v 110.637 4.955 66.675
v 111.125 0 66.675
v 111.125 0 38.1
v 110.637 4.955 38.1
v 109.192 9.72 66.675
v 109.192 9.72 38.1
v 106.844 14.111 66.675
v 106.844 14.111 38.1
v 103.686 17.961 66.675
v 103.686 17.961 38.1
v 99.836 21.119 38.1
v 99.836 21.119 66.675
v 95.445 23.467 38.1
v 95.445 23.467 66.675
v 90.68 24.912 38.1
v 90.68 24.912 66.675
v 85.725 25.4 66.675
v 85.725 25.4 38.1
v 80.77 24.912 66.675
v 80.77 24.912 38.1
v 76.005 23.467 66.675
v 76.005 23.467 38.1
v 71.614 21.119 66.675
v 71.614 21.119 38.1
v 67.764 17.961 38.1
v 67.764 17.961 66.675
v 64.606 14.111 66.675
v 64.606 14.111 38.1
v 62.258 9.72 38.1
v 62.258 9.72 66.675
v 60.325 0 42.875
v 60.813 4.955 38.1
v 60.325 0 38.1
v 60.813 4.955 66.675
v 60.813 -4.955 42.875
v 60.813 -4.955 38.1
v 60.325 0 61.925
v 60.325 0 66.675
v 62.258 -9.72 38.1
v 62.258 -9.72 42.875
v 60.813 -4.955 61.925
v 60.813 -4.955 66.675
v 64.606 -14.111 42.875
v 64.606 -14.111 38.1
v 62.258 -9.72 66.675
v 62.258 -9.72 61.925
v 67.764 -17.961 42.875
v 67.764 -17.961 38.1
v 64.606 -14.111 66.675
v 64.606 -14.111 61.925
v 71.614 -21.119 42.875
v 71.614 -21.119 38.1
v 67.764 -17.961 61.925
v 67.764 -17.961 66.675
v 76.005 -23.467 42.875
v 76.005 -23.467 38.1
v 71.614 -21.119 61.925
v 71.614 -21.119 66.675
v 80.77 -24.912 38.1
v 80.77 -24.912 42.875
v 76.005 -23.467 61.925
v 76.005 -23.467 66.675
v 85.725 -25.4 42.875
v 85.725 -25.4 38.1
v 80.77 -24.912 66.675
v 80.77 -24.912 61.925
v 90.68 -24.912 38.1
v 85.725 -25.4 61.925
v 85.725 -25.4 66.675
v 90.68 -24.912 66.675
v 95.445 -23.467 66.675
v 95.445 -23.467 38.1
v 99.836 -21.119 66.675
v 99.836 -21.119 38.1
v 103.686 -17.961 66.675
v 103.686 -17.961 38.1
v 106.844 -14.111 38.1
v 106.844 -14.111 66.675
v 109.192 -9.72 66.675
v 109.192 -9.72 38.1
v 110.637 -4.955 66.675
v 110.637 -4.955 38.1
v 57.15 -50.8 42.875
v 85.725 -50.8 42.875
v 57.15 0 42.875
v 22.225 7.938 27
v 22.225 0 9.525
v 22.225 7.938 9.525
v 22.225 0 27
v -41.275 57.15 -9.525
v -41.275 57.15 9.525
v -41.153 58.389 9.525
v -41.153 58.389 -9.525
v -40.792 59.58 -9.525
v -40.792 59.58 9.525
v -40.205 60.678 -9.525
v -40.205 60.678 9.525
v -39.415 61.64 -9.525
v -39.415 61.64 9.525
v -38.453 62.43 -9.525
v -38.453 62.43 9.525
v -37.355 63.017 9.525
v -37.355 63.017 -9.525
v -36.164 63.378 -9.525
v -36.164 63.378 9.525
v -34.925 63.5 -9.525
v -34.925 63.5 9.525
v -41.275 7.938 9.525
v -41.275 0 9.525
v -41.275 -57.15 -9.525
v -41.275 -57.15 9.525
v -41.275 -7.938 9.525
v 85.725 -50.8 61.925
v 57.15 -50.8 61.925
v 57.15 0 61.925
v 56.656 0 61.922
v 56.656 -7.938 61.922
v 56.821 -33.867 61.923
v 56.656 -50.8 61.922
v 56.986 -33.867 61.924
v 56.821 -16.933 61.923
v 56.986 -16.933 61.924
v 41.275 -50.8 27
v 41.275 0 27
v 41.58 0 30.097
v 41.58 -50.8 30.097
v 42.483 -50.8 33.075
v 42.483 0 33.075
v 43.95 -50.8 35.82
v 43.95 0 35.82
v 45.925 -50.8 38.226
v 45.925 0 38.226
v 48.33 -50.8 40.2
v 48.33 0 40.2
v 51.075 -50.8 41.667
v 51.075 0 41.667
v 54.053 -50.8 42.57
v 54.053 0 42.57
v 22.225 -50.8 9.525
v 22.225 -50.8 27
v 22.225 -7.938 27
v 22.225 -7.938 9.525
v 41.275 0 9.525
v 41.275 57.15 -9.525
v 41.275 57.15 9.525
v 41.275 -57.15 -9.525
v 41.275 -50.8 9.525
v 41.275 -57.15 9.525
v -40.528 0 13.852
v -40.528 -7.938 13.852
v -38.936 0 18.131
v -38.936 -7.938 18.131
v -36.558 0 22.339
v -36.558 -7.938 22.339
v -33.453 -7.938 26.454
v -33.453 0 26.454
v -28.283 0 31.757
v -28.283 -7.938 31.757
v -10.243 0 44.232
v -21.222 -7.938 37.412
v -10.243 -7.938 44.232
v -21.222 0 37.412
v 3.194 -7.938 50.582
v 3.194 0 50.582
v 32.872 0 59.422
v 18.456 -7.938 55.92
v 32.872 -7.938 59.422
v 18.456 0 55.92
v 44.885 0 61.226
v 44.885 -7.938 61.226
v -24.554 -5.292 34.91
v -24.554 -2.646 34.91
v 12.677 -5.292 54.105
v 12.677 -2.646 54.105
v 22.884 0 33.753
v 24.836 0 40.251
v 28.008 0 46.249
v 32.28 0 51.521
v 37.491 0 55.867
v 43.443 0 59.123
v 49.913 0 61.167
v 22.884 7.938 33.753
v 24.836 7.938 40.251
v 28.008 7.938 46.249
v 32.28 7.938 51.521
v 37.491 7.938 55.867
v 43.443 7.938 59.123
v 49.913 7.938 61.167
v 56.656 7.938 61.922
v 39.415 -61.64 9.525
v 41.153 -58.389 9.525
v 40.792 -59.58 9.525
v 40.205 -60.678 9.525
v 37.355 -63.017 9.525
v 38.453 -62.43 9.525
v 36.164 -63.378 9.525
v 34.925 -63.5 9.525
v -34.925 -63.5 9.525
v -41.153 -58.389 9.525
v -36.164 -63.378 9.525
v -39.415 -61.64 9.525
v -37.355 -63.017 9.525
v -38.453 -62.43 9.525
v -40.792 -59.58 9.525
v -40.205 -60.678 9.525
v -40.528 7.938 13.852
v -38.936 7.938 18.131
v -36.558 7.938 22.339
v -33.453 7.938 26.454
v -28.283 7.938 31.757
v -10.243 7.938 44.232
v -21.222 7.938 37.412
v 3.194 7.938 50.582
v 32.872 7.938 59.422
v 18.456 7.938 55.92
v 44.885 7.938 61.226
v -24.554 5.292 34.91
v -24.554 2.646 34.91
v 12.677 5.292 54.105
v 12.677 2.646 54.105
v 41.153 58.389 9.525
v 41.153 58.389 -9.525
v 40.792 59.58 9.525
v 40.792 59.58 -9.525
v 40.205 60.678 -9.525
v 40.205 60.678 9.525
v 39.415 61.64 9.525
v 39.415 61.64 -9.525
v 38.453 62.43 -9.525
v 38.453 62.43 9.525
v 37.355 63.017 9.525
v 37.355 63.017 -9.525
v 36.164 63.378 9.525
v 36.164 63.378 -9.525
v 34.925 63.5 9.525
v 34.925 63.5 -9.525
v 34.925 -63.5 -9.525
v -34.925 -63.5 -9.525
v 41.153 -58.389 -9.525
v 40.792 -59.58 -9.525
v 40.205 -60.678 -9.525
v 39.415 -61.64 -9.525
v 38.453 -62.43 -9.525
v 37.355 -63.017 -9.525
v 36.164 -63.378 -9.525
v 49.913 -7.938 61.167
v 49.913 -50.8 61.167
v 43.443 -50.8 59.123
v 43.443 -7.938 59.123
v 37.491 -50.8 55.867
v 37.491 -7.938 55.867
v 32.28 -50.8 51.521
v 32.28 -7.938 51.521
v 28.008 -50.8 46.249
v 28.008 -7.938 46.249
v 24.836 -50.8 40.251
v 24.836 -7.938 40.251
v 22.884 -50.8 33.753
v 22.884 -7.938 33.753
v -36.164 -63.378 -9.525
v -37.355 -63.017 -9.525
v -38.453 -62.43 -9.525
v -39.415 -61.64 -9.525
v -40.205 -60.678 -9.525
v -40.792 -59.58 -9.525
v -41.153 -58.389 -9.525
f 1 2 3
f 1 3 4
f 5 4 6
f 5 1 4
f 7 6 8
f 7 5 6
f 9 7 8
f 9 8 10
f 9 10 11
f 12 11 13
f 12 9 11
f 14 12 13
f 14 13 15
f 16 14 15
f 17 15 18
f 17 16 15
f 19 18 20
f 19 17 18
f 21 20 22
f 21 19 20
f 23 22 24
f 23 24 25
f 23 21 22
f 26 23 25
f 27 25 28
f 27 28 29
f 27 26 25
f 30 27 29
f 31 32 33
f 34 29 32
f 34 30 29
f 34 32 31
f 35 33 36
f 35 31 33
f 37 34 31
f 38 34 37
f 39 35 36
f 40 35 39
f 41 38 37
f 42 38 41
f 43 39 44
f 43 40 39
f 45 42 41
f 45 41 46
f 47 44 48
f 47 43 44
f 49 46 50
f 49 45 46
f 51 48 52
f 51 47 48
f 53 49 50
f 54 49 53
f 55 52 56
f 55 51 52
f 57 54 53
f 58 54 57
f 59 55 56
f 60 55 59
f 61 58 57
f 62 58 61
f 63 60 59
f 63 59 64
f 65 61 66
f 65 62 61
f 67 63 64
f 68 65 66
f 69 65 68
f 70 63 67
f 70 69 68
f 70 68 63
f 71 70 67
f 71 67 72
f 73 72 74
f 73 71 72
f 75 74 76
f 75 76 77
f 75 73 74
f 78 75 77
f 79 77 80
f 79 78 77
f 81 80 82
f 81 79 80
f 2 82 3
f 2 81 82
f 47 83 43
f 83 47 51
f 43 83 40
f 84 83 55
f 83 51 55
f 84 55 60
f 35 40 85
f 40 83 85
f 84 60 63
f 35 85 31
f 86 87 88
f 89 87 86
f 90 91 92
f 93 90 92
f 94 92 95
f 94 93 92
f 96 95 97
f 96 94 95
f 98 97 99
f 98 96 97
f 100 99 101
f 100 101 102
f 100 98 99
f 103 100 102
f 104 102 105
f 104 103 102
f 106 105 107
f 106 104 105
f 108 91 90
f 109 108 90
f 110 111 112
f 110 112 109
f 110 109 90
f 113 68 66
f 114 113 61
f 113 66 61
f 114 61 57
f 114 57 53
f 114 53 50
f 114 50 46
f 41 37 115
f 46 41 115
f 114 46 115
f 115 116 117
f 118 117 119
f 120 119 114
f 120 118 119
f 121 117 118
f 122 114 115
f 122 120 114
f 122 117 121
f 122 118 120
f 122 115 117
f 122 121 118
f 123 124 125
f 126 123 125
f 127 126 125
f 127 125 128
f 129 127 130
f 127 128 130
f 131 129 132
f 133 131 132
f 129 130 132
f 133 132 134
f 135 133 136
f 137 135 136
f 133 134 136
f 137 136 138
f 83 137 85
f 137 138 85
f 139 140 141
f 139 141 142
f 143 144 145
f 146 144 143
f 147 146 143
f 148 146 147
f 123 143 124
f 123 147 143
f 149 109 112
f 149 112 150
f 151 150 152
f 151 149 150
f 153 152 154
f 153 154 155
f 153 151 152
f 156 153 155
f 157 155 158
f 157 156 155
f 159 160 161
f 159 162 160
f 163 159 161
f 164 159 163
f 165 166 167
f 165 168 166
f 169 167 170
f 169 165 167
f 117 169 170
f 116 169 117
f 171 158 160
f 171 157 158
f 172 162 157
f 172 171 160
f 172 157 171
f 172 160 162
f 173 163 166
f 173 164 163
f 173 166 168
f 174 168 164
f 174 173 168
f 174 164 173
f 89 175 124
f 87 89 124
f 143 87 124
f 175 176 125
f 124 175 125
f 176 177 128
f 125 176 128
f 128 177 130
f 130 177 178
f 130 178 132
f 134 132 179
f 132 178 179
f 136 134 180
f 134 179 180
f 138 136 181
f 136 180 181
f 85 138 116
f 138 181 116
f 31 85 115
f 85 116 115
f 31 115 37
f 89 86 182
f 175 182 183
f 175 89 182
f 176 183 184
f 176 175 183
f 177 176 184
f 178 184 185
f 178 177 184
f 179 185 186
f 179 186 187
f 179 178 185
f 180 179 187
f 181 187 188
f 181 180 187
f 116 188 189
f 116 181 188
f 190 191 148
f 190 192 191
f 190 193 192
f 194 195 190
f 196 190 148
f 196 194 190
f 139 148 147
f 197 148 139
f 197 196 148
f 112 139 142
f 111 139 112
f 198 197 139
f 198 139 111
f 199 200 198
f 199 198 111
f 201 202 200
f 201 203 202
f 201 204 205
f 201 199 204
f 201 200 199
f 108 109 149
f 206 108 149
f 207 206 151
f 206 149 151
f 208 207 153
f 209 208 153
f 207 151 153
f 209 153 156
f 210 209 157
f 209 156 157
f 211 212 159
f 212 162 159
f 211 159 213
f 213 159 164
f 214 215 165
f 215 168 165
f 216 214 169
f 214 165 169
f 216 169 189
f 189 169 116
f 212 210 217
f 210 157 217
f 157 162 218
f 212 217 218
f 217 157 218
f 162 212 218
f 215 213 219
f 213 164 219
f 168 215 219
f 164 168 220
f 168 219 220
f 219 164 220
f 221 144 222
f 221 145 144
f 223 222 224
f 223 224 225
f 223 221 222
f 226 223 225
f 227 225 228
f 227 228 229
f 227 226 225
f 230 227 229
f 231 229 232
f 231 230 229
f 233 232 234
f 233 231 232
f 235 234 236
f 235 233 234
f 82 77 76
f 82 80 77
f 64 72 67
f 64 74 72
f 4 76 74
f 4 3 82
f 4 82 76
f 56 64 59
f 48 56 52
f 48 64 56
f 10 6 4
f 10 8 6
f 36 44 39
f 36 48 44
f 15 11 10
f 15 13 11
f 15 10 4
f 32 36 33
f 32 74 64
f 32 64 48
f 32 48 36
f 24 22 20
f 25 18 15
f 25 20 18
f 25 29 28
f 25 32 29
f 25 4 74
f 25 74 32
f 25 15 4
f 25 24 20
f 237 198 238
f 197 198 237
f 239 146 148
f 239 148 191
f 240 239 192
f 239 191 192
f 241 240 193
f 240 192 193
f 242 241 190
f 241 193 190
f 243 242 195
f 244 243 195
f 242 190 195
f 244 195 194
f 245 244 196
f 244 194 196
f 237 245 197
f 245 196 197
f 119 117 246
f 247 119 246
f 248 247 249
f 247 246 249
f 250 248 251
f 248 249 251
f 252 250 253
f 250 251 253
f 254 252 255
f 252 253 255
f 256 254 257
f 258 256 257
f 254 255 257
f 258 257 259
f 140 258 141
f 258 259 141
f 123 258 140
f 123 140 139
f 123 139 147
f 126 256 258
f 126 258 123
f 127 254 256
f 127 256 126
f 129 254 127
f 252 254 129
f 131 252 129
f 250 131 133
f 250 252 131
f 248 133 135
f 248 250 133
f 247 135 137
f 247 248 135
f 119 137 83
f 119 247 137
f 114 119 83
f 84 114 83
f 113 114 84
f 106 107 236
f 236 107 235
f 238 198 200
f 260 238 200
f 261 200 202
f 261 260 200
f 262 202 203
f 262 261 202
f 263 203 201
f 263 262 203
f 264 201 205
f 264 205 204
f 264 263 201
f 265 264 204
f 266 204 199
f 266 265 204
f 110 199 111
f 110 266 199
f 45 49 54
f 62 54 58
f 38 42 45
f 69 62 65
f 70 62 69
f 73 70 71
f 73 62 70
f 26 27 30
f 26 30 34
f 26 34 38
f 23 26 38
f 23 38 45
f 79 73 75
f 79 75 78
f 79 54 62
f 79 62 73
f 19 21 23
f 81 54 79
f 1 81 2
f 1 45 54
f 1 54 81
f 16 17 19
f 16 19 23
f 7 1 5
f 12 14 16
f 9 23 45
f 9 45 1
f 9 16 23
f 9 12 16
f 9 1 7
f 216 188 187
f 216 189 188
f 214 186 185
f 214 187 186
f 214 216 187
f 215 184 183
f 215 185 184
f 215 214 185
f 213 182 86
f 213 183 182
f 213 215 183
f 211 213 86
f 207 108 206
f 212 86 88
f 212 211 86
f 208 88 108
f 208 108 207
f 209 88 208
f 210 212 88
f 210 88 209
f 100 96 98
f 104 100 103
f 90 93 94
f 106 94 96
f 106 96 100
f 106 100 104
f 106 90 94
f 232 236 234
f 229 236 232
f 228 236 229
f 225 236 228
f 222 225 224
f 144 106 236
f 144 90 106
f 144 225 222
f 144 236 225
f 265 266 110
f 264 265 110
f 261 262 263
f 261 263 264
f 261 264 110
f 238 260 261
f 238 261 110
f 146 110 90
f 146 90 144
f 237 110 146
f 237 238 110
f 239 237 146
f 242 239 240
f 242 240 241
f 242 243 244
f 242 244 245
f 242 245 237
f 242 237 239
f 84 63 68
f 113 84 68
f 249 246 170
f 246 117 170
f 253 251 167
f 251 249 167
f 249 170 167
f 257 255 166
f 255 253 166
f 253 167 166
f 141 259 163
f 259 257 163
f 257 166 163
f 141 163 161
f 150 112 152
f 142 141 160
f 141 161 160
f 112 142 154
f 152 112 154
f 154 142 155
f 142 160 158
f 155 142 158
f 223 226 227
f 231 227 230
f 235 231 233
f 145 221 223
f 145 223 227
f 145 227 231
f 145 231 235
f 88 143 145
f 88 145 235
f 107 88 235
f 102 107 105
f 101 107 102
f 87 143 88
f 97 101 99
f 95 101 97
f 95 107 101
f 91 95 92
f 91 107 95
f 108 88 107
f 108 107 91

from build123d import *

# Parameters (mm, degrees)
F1_DEPTH = 63.5
F0_W     = 25.4
F0_H     = 19.05
F2_DEPTH = 50.8
F3_DEPTH = 7.9375
F5_R     = 6.35
F6_R     = 6.35


with BuildPart() as f1:
    # F0 (on Front) → F1 (new body, symmetric)
    with BuildSketch(Plane.XZ):
        Polygon((-41.275, 9.525), (-41.275, -9.525), (41.275, -9.525), (41.275, 9.525), (22.225, 9.525), align=None)
    extrude(amount=F1_DEPTH, both=True)

    # F0 (on Front) → F2 (join)
    with BuildSketch(Plane.XZ):
        with Locations((73.025, 52.4002)):
            Rectangle(F0_W, F0_H)
        with BuildLine():
            Line((22.225, 9.525), (41.275, 9.525))
            Line((41.275, 9.525), (41.275, 27.0002))
            ThreePointArc((41.275, 27.0002), (45.9246798487, 38.2255201513), (57.15, 42.8752))
            Line((57.15, 42.8752), (60.325, 42.8752))
            Line((60.325, 42.8752), (60.325, 61.9252))
            Line((60.325, 61.9252), (57.15, 61.9252))
            add(Edge.make_bspline(
                [(56.6563688667, 61.9217113262), (56.8210697668, 61.9232432232), (56.985614657, 61.924406559), (57.15, 61.9252)],
                knots=[111.0767656068, 111.0767656068, 111.0767656068, 111.0767656068, 111.5045361635, 111.5045361635, 111.5045361635, 111.5045361635], degree=3))
            ThreePointArc((56.6563688667, 61.9217113262), (32.2803830716, 51.5207582896), (22.225, 27.0002))
            Line((22.225, 27.0002), (22.225, 9.525))
        make_face()
    extrude(amount=F2_DEPTH)

    # F0 (on Front) → F3 (join, symmetric)
    with BuildSketch(Plane.XZ):
        with BuildLine():
            add(Edge.make_bspline(
                [(-41.275, 9.525), (-39.3966058036, 36.2756986169), (13.8894158841, 61.52393227), (56.6563688667, 61.9217113262)],
                knots=[0, 0, 0, 0, 111.0767656068, 111.0767656068, 111.0767656068, 111.0767656068], degree=3))
            Line((-41.275, 9.525), (22.225, 9.525))
            Line((22.225, 9.525), (22.225, 27.0002))
            ThreePointArc((22.225, 27.0002), (32.2803830716, 51.5207582896), (56.6563688667, 61.9217113262))
        make_face()
    extrude(amount=F3_DEPTH, both=True)

    # F0 (on Front) → F4 (revolve)
    with BuildSketch(Plane.XZ):
        Polygon((85.725, 66.675), (85.725, 61.9252), (85.725, 42.8752), (85.725, 38.1), (111.125, 38.1), (111.125, 66.675), align=None)
    revolve(axis=Axis((85.725, 0, 54.7751), (0, 0, 1)))

    # F5
    f5_edges = [f1.edges().sort_by_distance(p)[0] for p in [
        (-41.275, -63.5, 0),
        (41.275, -63.5, 0),
        (41.275, 63.5, 0),
    ]]
    fillet(f5_edges, radius=F5_R)

    # F6
    f6_edges = [f1.edges().sort_by_distance(p)[0] for p in [
        (-41.275, 63.5, 0),
    ]]
    fillet(f6_edges, radius=F6_R)


solid = f1.part
